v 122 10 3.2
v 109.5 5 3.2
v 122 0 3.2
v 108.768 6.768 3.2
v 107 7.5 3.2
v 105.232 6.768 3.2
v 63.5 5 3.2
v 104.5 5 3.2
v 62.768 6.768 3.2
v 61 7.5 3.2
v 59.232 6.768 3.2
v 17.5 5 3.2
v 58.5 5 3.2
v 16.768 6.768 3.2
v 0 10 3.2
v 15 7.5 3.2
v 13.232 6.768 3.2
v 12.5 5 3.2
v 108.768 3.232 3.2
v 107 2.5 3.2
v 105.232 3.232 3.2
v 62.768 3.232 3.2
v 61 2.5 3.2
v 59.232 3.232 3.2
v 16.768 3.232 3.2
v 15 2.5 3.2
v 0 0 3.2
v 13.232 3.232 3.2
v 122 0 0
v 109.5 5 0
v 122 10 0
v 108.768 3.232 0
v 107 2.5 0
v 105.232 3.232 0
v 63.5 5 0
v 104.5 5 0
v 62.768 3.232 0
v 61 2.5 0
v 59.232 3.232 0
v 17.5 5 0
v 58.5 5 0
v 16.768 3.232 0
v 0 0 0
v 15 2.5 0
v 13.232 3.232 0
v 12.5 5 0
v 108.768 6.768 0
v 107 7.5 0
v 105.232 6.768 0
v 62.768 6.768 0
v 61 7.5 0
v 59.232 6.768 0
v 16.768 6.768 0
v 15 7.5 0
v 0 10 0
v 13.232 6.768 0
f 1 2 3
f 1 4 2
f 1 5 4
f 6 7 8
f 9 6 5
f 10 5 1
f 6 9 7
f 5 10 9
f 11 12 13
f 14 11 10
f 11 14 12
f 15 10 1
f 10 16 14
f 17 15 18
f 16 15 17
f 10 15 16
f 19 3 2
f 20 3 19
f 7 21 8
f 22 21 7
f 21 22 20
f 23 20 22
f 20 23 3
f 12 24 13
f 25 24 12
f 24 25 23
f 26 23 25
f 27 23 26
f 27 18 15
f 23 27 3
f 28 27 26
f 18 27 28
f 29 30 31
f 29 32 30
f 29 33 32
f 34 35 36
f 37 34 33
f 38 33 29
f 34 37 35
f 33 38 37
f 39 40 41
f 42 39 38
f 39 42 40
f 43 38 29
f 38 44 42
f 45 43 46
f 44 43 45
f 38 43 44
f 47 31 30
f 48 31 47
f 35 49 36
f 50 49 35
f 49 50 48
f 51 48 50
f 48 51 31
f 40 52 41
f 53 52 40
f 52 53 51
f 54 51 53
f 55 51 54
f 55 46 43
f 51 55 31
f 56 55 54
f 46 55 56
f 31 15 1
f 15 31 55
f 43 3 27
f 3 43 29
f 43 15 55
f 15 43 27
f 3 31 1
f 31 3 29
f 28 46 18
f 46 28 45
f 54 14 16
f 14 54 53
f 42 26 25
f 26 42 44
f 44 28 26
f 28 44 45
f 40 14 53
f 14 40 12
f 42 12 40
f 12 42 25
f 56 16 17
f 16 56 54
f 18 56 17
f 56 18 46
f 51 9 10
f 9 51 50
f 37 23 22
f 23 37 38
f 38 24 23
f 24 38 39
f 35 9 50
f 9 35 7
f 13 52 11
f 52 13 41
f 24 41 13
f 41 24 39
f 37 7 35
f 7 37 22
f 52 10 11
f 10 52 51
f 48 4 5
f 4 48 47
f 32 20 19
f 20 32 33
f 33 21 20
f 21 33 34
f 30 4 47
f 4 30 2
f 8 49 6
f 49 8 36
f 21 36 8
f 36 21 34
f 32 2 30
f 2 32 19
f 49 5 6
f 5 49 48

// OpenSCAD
// Author: Rob Rakaric
// Model Description: Parametric spacer for offsetting electrical devices from electrical boxes
// Units: mm

// Parameters
numberOfGangs = 3; // Number of gangs (devices) in box
spacerThickness = 3.2; // Thickness of spacer

difference(){

    // Parameters configured for standard US electrical device boxes
    // Do not change unless you know what you are doing

    endLengths = 15; // Length of end pieces
    distanceBetweenGangs = 46; // Distance between gangs (devices) in box
    spacerWidth = 10; // Width of spacer
    holeDiameter= 5; // Diameter of holes

    union() {
    
        // Start piece
        cube([endLengths, spacerWidth, spacerThickness]);
        
        // Pieces for each gang in box (when box is 2-gang or more)
        for (i = [1:1:numberOfGangs]) {
  
            if (i > 1) {

                translate([(i - 2) * distanceBetweenGangs + endLengths, 0, 0])
                    cube([distanceBetweenGangs, spacerWidth, spacerThickness]);
            };
        };
        
        // End piece
        
        translate([(distanceBetweenGangs * (numberOfGangs - 1)) + endLengths, 0, 0])
          cube([endLengths, spacerWidth, spacerThickness]);
        
    };

    for (i = [1:1:numberOfGangs]) {

      if (i == 1) {
        translate([endLengths, spacerWidth / 2, 0])
          linear_extrude(spacerThickness)
            circle(d = holeDiameter); 
      };

      translate([(i - 1) * distanceBetweenGangs + endLengths, spacerWidth / 2, 0])
        linear_extrude(spacerThickness)
          circle(d = holeDiameter);   
    };
};
